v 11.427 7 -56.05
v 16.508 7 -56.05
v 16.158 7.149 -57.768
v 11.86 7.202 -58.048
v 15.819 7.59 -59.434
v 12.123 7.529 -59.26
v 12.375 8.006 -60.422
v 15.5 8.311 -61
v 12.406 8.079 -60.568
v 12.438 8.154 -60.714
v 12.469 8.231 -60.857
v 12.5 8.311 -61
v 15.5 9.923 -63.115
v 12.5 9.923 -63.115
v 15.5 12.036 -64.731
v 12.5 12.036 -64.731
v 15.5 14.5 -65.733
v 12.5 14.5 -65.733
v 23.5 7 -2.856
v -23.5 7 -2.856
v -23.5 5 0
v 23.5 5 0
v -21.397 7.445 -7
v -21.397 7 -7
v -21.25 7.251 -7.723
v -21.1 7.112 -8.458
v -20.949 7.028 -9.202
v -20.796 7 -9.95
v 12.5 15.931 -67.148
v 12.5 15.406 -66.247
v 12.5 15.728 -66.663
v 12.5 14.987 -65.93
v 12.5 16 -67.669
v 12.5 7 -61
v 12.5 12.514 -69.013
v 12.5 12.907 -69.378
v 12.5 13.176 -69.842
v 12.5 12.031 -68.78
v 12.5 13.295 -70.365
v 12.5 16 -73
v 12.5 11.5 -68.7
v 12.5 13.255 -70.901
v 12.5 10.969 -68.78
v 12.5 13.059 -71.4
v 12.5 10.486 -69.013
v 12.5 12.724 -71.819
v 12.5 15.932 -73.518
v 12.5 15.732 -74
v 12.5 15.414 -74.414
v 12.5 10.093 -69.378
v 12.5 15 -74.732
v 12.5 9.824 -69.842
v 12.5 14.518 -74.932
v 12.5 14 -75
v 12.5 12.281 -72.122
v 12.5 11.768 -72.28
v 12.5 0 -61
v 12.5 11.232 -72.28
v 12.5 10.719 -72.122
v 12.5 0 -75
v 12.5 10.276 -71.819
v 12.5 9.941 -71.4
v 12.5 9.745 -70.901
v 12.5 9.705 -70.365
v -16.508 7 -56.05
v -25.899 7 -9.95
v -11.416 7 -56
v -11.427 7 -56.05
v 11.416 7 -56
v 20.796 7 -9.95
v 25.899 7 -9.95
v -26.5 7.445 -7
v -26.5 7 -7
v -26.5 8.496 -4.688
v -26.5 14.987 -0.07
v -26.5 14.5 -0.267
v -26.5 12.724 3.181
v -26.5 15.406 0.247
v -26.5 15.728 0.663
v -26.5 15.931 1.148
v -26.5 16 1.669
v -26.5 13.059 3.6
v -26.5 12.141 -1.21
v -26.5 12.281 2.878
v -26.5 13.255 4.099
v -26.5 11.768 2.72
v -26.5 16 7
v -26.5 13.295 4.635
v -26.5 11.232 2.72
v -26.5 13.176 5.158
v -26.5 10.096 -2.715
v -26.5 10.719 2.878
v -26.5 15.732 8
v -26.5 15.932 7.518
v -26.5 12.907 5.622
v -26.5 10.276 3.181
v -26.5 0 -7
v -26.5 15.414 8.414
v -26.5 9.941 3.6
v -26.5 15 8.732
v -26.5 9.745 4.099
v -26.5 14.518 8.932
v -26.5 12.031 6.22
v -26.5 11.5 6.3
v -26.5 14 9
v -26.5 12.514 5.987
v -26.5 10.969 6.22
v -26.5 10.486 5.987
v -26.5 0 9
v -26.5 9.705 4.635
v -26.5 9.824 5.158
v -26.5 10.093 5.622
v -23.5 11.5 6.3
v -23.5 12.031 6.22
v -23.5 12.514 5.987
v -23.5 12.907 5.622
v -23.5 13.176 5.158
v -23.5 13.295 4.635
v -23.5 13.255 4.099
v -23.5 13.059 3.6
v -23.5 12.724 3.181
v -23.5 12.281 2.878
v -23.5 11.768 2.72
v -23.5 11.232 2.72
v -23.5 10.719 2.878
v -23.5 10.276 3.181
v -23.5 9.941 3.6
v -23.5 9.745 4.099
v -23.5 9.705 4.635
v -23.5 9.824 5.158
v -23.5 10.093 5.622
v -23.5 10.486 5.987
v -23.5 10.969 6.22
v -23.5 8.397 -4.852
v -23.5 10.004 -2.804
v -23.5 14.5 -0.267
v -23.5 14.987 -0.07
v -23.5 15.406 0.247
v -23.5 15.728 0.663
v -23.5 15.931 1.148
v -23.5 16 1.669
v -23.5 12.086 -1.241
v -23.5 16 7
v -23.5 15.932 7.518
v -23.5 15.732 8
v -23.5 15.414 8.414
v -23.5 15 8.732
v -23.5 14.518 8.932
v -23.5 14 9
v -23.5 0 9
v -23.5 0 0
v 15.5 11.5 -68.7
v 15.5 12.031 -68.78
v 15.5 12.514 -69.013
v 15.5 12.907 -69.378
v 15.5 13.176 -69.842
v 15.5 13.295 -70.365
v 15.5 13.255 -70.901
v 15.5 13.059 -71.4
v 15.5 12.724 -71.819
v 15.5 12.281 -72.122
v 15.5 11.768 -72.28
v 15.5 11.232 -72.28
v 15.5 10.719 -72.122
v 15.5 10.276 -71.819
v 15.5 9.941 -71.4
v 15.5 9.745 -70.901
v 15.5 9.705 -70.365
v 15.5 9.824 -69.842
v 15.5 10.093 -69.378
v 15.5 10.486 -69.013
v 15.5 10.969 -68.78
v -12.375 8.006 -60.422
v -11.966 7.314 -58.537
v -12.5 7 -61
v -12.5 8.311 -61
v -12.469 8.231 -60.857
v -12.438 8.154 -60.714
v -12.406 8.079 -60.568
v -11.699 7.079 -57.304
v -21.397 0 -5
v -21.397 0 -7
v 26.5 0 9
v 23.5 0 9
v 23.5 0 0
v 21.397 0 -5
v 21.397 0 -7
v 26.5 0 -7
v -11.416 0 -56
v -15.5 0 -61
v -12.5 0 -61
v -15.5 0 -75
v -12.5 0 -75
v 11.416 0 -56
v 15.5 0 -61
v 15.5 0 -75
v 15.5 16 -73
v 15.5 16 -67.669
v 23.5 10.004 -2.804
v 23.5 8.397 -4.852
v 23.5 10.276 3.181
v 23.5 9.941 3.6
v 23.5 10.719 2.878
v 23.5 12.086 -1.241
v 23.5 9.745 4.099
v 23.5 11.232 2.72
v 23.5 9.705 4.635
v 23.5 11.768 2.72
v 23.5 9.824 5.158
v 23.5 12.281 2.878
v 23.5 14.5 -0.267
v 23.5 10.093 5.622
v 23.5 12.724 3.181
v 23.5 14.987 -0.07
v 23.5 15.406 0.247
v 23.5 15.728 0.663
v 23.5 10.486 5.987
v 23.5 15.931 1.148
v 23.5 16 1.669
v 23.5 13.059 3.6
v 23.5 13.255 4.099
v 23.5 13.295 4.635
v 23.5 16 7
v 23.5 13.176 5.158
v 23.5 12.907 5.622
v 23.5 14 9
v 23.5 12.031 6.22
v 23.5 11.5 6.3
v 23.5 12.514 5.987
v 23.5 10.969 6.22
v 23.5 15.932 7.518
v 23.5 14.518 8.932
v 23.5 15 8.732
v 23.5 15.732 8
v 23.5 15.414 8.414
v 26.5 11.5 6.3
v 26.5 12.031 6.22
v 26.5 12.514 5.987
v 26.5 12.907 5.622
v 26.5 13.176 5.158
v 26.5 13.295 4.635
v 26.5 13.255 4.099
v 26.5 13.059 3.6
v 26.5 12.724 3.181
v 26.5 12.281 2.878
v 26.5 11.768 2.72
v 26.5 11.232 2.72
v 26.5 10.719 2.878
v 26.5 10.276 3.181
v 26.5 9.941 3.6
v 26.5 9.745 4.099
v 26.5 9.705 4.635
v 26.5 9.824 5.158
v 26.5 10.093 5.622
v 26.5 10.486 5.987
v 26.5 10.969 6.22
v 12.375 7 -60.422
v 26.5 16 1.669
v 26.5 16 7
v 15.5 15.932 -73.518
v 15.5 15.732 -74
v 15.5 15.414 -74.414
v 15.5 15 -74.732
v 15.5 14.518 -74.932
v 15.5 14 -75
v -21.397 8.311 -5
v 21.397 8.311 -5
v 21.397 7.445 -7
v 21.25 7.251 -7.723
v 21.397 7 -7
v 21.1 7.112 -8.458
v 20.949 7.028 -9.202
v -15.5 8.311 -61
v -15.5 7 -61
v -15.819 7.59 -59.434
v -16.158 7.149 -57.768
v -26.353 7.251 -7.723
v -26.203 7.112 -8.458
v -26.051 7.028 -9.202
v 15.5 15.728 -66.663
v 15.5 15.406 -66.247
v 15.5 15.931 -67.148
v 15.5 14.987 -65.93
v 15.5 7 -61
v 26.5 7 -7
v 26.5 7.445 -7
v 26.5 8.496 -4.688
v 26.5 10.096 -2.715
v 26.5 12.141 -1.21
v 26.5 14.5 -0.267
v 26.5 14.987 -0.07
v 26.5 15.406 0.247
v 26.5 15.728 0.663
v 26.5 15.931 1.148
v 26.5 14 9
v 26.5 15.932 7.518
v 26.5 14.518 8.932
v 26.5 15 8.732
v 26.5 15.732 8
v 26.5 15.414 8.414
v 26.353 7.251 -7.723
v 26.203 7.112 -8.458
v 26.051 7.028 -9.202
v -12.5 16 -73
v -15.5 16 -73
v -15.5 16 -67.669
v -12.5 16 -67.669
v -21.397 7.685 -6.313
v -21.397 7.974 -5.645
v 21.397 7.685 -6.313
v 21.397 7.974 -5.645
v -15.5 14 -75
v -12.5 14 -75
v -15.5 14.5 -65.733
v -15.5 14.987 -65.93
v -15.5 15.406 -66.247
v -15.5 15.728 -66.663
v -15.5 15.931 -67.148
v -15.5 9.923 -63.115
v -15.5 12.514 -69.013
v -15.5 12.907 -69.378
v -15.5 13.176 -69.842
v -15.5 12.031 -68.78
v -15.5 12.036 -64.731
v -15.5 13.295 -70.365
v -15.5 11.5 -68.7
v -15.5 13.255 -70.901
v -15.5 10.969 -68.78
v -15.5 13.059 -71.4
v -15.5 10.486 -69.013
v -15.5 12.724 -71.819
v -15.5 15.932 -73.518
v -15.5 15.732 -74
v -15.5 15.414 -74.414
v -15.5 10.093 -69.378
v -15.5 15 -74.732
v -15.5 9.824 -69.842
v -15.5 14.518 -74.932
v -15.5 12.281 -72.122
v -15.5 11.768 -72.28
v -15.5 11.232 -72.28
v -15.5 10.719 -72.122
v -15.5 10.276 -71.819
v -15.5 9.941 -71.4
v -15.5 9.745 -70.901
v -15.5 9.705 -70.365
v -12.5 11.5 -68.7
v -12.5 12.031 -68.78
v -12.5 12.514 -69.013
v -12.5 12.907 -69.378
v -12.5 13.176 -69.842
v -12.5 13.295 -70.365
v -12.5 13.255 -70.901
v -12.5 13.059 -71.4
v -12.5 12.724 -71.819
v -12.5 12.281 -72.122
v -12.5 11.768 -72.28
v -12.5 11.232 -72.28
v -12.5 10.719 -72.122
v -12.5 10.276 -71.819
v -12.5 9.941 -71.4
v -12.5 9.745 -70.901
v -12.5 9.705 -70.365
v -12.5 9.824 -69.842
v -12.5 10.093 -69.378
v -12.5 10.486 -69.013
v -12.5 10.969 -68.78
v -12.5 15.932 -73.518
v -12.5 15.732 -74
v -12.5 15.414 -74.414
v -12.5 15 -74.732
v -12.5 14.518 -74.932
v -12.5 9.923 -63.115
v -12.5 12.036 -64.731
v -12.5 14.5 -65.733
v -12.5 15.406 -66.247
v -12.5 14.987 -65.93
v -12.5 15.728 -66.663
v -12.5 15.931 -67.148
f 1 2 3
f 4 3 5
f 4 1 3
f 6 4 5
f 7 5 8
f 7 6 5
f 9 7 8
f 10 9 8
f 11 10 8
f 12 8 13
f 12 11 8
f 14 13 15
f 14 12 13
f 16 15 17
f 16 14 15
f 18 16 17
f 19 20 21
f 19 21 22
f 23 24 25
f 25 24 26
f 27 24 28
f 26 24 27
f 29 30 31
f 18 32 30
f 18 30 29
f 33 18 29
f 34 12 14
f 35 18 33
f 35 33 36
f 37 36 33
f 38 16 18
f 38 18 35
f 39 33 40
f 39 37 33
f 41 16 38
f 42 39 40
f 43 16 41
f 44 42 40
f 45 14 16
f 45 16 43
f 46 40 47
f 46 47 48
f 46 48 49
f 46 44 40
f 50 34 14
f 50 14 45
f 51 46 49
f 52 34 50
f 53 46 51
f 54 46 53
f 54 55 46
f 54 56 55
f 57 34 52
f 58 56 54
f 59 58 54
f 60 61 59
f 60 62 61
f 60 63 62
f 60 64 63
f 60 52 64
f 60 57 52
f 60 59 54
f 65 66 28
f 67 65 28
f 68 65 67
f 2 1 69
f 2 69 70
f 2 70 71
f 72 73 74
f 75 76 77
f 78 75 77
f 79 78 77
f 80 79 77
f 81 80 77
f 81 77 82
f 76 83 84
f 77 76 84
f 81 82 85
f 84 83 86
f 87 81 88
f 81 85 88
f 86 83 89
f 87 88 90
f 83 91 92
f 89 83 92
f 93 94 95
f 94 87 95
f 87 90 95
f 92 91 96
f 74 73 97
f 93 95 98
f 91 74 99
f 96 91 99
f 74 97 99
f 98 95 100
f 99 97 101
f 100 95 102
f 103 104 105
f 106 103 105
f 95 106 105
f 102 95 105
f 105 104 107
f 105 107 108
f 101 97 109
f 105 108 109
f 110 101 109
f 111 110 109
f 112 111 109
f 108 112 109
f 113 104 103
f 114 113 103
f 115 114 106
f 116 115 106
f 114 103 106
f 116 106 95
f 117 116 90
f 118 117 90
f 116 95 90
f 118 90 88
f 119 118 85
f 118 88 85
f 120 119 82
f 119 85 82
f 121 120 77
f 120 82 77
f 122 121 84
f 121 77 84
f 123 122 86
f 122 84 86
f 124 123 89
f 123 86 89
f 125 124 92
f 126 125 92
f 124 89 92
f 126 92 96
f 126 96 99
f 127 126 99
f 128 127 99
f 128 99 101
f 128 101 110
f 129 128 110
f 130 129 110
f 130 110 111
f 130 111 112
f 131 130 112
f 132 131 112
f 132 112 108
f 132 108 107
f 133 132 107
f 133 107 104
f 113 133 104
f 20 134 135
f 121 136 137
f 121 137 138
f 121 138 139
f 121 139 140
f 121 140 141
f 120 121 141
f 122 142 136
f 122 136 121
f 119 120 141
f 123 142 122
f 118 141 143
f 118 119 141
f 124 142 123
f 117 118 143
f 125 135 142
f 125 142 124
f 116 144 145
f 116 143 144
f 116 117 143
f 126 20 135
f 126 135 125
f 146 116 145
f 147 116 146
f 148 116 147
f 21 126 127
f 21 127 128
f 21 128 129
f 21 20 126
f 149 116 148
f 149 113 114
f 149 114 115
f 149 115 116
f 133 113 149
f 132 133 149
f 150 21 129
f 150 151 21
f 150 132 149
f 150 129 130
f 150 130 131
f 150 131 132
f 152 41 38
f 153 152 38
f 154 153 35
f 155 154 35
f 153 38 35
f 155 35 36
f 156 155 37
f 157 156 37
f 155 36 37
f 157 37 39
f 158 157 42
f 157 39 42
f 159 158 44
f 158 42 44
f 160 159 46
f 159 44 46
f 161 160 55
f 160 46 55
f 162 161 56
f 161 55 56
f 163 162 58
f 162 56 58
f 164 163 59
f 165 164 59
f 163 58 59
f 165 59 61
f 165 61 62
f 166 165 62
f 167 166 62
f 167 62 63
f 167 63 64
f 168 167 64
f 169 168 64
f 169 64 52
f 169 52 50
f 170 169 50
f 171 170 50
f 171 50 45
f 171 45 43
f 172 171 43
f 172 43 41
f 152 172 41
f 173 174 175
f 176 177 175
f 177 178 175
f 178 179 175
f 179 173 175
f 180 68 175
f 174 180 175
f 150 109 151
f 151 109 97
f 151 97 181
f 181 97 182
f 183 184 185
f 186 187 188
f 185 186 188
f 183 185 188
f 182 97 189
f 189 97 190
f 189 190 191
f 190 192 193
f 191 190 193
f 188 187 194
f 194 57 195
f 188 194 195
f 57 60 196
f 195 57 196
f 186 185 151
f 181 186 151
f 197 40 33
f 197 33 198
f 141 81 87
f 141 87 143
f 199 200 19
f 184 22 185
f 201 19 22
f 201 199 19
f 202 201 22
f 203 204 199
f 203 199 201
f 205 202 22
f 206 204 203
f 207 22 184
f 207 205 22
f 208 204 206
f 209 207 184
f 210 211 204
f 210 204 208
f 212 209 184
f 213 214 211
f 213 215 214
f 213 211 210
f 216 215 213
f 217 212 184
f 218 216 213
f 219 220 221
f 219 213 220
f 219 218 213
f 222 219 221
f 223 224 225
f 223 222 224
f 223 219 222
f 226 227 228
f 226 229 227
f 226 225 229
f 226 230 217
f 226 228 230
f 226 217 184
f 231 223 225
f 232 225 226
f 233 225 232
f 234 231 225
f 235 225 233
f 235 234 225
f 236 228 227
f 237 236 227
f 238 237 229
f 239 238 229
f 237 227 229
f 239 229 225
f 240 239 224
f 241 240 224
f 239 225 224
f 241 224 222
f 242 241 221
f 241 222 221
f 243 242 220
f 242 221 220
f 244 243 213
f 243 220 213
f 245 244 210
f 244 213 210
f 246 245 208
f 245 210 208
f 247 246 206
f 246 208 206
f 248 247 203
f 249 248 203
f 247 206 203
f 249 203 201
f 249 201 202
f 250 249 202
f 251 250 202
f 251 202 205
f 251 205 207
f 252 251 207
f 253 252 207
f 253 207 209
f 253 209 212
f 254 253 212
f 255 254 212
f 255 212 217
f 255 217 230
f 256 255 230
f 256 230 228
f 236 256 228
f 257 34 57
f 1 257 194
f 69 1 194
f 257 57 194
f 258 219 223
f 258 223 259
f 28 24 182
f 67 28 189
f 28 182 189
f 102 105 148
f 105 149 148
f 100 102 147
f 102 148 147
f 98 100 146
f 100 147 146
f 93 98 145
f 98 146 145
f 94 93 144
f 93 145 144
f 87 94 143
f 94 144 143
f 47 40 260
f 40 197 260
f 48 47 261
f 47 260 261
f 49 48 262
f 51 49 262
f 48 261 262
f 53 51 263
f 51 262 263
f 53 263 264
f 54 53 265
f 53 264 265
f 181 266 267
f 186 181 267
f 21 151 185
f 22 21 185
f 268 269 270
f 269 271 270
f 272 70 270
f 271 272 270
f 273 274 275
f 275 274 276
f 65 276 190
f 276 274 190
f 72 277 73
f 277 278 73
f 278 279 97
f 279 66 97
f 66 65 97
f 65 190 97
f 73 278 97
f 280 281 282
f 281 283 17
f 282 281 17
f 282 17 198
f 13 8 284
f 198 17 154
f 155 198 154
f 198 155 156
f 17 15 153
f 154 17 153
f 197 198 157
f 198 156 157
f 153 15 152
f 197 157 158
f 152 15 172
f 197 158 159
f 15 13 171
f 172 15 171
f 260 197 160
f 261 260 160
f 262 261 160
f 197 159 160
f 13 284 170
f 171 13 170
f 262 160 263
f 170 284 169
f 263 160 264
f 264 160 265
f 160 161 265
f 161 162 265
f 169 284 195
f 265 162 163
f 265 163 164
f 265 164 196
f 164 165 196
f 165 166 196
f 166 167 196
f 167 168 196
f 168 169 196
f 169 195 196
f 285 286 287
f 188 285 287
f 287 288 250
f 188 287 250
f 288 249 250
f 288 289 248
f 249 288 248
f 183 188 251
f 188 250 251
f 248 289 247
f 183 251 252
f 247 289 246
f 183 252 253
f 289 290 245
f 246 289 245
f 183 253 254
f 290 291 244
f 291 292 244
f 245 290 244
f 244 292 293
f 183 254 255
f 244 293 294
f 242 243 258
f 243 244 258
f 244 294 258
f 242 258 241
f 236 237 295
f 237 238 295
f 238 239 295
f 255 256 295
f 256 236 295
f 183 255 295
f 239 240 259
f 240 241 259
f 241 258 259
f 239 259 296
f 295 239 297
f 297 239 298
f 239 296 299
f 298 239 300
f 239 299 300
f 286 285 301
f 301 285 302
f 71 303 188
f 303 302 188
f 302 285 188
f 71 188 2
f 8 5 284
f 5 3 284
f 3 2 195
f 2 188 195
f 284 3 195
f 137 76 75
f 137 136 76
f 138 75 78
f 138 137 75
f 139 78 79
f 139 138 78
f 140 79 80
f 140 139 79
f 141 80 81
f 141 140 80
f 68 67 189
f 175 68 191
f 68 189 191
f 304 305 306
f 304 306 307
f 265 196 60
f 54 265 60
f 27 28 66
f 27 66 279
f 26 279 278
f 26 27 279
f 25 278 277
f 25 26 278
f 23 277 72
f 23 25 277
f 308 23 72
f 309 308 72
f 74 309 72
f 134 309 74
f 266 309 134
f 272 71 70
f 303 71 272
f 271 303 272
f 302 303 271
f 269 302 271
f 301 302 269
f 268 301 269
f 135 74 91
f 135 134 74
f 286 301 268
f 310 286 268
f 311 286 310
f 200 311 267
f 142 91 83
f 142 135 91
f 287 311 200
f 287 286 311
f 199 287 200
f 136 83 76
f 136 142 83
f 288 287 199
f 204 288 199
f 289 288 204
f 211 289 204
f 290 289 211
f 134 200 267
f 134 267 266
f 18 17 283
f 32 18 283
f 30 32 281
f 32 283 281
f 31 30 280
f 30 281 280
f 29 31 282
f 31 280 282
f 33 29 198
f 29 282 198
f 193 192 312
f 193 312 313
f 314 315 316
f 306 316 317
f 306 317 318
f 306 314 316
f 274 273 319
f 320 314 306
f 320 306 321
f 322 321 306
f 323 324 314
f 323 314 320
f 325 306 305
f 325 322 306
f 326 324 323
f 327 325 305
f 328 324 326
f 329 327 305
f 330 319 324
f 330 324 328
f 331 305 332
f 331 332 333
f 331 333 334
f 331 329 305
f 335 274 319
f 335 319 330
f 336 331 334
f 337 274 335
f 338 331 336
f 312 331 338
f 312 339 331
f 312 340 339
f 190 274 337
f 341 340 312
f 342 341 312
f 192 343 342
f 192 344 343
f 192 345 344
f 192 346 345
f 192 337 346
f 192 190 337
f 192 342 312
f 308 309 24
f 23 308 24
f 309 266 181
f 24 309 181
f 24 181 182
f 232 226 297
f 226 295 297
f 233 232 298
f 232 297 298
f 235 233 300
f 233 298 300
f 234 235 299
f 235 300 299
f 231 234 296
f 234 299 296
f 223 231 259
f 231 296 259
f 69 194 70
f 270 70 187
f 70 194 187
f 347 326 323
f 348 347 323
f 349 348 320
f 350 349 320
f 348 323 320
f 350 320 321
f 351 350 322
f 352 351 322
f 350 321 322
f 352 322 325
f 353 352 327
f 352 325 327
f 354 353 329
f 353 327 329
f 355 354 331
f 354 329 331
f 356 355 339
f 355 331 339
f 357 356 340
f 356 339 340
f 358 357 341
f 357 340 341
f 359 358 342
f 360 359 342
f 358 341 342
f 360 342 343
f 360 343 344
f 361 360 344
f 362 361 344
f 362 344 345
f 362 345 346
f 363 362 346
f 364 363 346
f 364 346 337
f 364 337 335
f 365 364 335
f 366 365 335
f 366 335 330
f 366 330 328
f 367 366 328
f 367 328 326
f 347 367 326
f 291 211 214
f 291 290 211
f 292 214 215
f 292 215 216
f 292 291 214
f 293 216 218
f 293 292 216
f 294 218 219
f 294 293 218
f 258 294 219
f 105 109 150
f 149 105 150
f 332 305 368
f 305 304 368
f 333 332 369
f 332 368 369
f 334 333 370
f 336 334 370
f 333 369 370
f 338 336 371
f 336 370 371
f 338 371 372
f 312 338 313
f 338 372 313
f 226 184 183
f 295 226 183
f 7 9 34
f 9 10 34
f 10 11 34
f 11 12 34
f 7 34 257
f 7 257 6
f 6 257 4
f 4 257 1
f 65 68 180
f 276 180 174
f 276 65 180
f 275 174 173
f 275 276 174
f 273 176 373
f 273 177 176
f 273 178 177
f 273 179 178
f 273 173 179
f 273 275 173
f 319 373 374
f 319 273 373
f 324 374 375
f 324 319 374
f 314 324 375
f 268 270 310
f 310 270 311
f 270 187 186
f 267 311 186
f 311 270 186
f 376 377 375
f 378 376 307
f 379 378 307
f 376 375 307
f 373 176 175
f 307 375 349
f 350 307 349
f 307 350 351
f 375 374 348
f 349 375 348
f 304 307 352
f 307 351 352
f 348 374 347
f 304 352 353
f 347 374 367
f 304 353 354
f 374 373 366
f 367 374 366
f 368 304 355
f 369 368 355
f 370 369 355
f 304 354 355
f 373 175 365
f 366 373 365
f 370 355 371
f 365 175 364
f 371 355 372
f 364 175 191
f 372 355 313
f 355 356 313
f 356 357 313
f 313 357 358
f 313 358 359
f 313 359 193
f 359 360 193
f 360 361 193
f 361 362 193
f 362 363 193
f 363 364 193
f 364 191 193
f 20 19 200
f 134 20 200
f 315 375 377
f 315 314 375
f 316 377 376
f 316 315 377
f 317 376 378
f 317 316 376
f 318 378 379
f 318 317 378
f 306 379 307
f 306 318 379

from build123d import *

# Parameters (mm, degrees)
BOSS_EXTRUDE1_DEPTH  = 7
BOSS_EXTRUDE2_START  = 7
SKETCH1_3_W          = 3
SKETCH1_3_H          = 9
BOSS_EXTRUDE2_DEPTH  = 9
M3_CLEARANCE_HOLE1_D = 3.6
CHAMFER1_SIZE        = 2
CHAMFER1_SIZE2       = 2.856296013
FILLET1_R            = 10
FILLET2_R            = 2


with BuildPart() as part:
    # Sketch1 → Boss-Extrude1 (new body)
    with BuildSketch(Plane(origin=(0, 0, 0), x_dir=(1, 0, 0), z_dir=(0, 1, 0))):
        Polygon((-23.5, -9), (-23.5, 0), (23.5, 0), (23.5, -9), (26.5, -9), (26.5, 7), (15.5, 61), (15.5, 75), (12.5, 75), (12.5, 61), (11.415834914, 56), (21.397316395, 7), (21.397316395, 5), (-21.397316395, 5), (-21.397316395, 7), (-11.415834914, 56), (-12.5, 61), (-12.5, 75), (-15.5, 75), (-15.5, 61), (-26.5, 7), (-26.5, -9), align=None)
    extrude(amount=BOSS_EXTRUDE1_DEPTH)

    # Sketch1<3> → Boss-Extrude2 (add)
    with BuildSketch(Plane(origin=(0, 0, 0), x_dir=(1, 0, 0), z_dir=(0, 1, 0)).offset(BOSS_EXTRUDE2_START)):
        with Locations((-14, 70.5)):
            Rectangle(SKETCH1_3_W, SKETCH1_3_H)
        with Locations((14, 70.5)):
            Rectangle(SKETCH1_3_W, SKETCH1_3_H)
        with Locations((-25, -4.5)):
            Rectangle(SKETCH1_3_W, SKETCH1_3_H)
        with Locations((25, -4.5)):
            Rectangle(SKETCH1_3_W, SKETCH1_3_H)
    extrude(amount=BOSS_EXTRUDE2_DEPTH)

    # M3 Clearance Hole1 (through all)
    with Locations(Plane(origin=(26.5, 0, 0), x_dir=(0, 0, -1), z_dir=(1, 0, 0))):
        with Locations((-4.5, 11.5), (70.5, 11.5)):
            Hole(M3_CLEARANCE_HOLE1_D / 2)

    # Chamfer1
    chamfer1_edges = [part.edges().sort_by_distance(p)[0] for p in [
        (0, 7, 0),
    ]]
    chamfer1_side = [part.faces().sort_by_distance(p)[0] for p in [
        (0, 3.5, 0),
    ]]
    chamfer(chamfer1_edges, length=CHAMFER1_SIZE, length2=CHAMFER1_SIZE2, reference=chamfer1_side[0])

    # Fillet1
    # the kernel refuses this fillet: 10 mm, written as the material it adds along each edge
    with BuildSketch(Plane(origin=(-1.374685928, 7, 0), x_dir=(0, 0, -1), z_dir=(1, 0, 0))) as fillet1_piece_1_section:
        with BuildLine():
            CenterArc((9.949874371, 10), FILLET1_R, 185.739170477, 84.260829523)
            Line((0, 9), (0, 0))
            Line((0, 0), (9.949874371, 0))
        make_face()
    fillet1_piece_1 = extrude(amount=27.874685928, mode=Mode.PRIVATE)
    fillet1_piece_1 = split(fillet1_piece_1, bisect_by=Plane(origin=(10.011315234, 8.407248867, -4.866055679), z_dir=(0, -0.819152044288993, -0.5735764363510445)), keep=Keep.TOP, mode=Mode.PRIVATE)
    fillet1_piece_1 = split(fillet1_piece_1, bisect_by=Plane(origin=(10.011315234, 8.336481062, -5), z_dir=(0, 0, 1)), keep=Keep.TOP, mode=Mode.PRIVATE)
    add(fillet1_piece_1)
    with BuildSketch(Plane(origin=(-1.374685928, 7, 0), x_dir=(0, 0, -1), z_dir=(1, 0, 0))) as fillet1_piece_2_section:
        with BuildLine():
            CenterArc((9.949874371, 10), FILLET1_R, 185.739170477, 84.260829523)
            Line((0, 9), (0, 0))
            Line((0, 0), (9.949874371, 0))
        make_face()
    fillet1_piece_2 = extrude(amount=27.874685928, mode=Mode.PRIVATE)
    fillet1_piece_2 = split(fillet1_piece_2, bisect_by=Plane(origin=(26.506585427, 7.804991574, -6.967671542), z_dir=(-0.9798765487080173, 0, 0.19960448214422577)), keep=Keep.TOP, mode=Mode.PRIVATE)
    fillet1_piece_2 = split(fillet1_piece_2, bisect_by=Plane(origin=(21.601020113, 7.804991574, -5), z_dir=(0, 0, -1)), keep=Keep.TOP, mode=Mode.PRIVATE)
    fillet1_piece_2 = split(fillet1_piece_2, bisect_by=Plane(origin=(21.397316395, 7.804991574, -5.968389718), z_dir=(1, 0, 0)), keep=Keep.TOP, mode=Mode.PRIVATE)
    add(fillet1_piece_2)
    with BuildSketch(Plane(origin=(-1.374685928, 7, 0), x_dir=(0, 0, -1), z_dir=(1, 0, 0))) as fillet1_piece_3_section:
        with BuildLine():
            CenterArc((9.949874371, 10), FILLET1_R, 185.739170477, 84.260829523)
            Line((0, 9), (0, 0))
            Line((0, 0), (9.949874371, 0))
        make_face()
    fillet1_piece_3 = extrude(amount=52.749371855, mode=Mode.PRIVATE)
    fillet1_piece_3 = split(fillet1_piece_3, bisect_by=Plane(origin=(20.913958027, 7.01045348, -9.37285017), z_dir=(0.9798765487080173, 0, -0.1996044821442258)), keep=Keep.TOP, mode=Mode.PRIVATE)
    fillet1_piece_3 = split(fillet1_piece_3, bisect_by=Plane(origin=(21.397316395, 7.01045348, -9.450911129), z_dir=(-1, 0, 0)), keep=Keep.TOP, mode=Mode.PRIVATE)
    add(fillet1_piece_3)
    with BuildSketch(Plane(origin=(23.5, 7, 0), x_dir=(0, 0, -1), z_dir=(1, 0, 0))) as fillet1_piece_4_section:
        with BuildLine():
            CenterArc((9.949874371, 10), FILLET1_R, 185.739170477, 84.260829523)
            Line((0, 9), (0, 0))
            Line((0, 0), (9.949874371, 0))
        make_face()
    fillet1_piece_4 = extrude(amount=3, mode=Mode.PRIVATE)
    fillet1_piece_4 = split(fillet1_piece_4, bisect_by=Plane(origin=(25, 11.609815369, -5), z_dir=(0, 0, 1)), keep=Keep.TOP, mode=Mode.PRIVATE)
    add(fillet1_piece_4)
    with BuildSketch(Plane(origin=(-15.5, 7, -66), x_dir=(0, 0, 1), z_dir=(1, 0, 0))) as fillet1_piece_5_section:
        with BuildLine():
            CenterArc((9.949874371, -10), FILLET1_R, 90, 84.260829523)
            Line((0, -9), (0, 0))
            Line((0, 0), (9.949874371, 0))
        make_face()
    fillet1_piece_5 = extrude(amount=27.874685928, mode=Mode.PRIVATE)
    fillet1_piece_5 = split(fillet1_piece_5, bisect_by=Plane(origin=(-13.326382184, 11.537566275, -64.811145527), z_dir=(-0.9772894830316591, 0, 0.21190862737442448)), keep=Keep.TOP, mode=Mode.PRIVATE)
    add(fillet1_piece_5)
    with BuildSketch(Plane(origin=(-40.374685928, 7, -66), x_dir=(0, 0, 1), z_dir=(1, 0, 0))) as fillet1_piece_6_section:
        with BuildLine():
            CenterArc((9.949874371, -10), FILLET1_R, 90, 84.260829523)
            Line((0, -9), (0, 0))
            Line((0, 0), (9.949874371, 0))
        make_face()
    fillet1_piece_6 = extrude(amount=27.874685928, mode=Mode.PRIVATE)
    fillet1_piece_6 = split(fillet1_piece_6, bisect_by=Plane(origin=(-16.305903703, 7.017292707, -57.04374546), z_dir=(0.9798765487080173, 0, 0.19960448214422577)), keep=Keep.TOP, mode=Mode.PRIVATE)
    add(fillet1_piece_6)
    with BuildSketch(Plane(origin=(-40.374685928, 7, -66), x_dir=(0, 0, 1), z_dir=(1, 0, 0))) as fillet1_piece_7_section:
        with BuildLine():
            CenterArc((9.949874371, -10), FILLET1_R, 90, 84.260829523)
            Line((0, -9), (0, 0))
            Line((0, 0), (9.949874371, 0))
        make_face()
    fillet1_piece_7 = extrude(amount=52.749371855, mode=Mode.PRIVATE)
    fillet1_piece_7 = split(fillet1_piece_7, bisect_by=Plane(origin=(11.618519357, 7.008478839, -56.93474899), z_dir=(0.977289483031659, 0, 0.2119086273744248)), keep=Keep.TOP, mode=Mode.PRIVATE)
    add(fillet1_piece_7)
    with BuildSketch(Plane(origin=(-12.374685928, 7, -66), x_dir=(0, 0, 1), z_dir=(1, 0, 0))) as fillet1_piece_8_section:
        with BuildLine():
            CenterArc((9.949874371, -10), FILLET1_R, 90, 84.260829523)
            Line((0, -9), (0, 0))
            Line((0, 0), (9.949874371, 0))
        make_face()
    fillet1_piece_8 = extrude(amount=52.749371855, mode=Mode.PRIVATE)
    fillet1_piece_8 = split(fillet1_piece_8, bisect_by=Plane(origin=(-11.604329561, 7.008478839, -56.869307865), z_dir=(-0.9772894830316591, 0, 0.21190862737442448)), keep=Keep.TOP, mode=Mode.PRIVATE)
    add(fillet1_piece_8)
    with BuildSketch(Plane(origin=(12.5, 7, -66), x_dir=(0, 0, 1), z_dir=(1, 0, 0))) as fillet1_piece_9:
        with BuildLine():
            CenterArc((9.949874371, -10), FILLET1_R, 90, 84.260829523)
            Line((0, -9), (0, 0))
            Line((0, 0), (9.949874371, 0))
        make_face()
    extrude(amount=3)
    with BuildSketch(Plane(origin=(-12.374685928, 7, -66), x_dir=(0, 0, 1), z_dir=(1, 0, 0))) as fillet1_piece_10_section:
        with BuildLine():
            CenterArc((9.949874371, -10), FILLET1_R, 90, 84.260829523)
            Line((0, -9), (0, 0))
            Line((0, 0), (9.949874371, 0))
        make_face()
    fillet1_piece_10 = extrude(amount=52.749371855, mode=Mode.PRIVATE)
    fillet1_piece_10 = split(fillet1_piece_10, bisect_by=Plane(origin=(16.17255533, 7.017292707, -57.698364743), z_dir=(-0.9798765487080173, 0, 0.19960448214422577)), keep=Keep.TOP, mode=Mode.PRIVATE)
    fillet1_piece_10 = split(fillet1_piece_10, bisect_by=Plane(origin=(11.645733853, 7.017292707, -57.060257993), z_dir=(0.977289483031659, 0, 0.2119086273744248)), keep=Keep.TOP, mode=Mode.PRIVATE)
    add(fillet1_piece_10)
    with BuildSketch(Plane(origin=(1.374685928, 7, 0), x_dir=(0, 0, -1), z_dir=(-1, 0, 0))) as fillet1_piece_11_section:
        with BuildLine():
            CenterArc((9.949874371, -10), FILLET1_R, 90, 84.260829523)
            Line((0, -9), (0, 0))
            Line((0, 0), (9.949874371, 0))
        make_face()
    fillet1_piece_11 = extrude(amount=27.874685928, mode=Mode.PRIVATE)
    fillet1_piece_11 = split(fillet1_piece_11, bisect_by=Plane(origin=(-10.011315234, 8.407248867, -4.866055679), z_dir=(0, -0.819152044288993, -0.5735764363510445)), keep=Keep.TOP, mode=Mode.PRIVATE)
    fillet1_piece_11 = split(fillet1_piece_11, bisect_by=Plane(origin=(-10.011315234, 8.336481062, -5), z_dir=(0, 0, 1)), keep=Keep.TOP, mode=Mode.PRIVATE)
    add(fillet1_piece_11)
    with BuildSketch(Plane(origin=(1.374685928, 7, 0), x_dir=(0, 0, -1), z_dir=(-1, 0, 0))) as fillet1_piece_12_section:
        with BuildLine():
            CenterArc((9.949874371, -10), FILLET1_R, 90, 84.260829523)
            Line((0, -9), (0, 0))
            Line((0, 0), (9.949874371, 0))
        make_face()
    fillet1_piece_12 = extrude(amount=27.874685928, mode=Mode.PRIVATE)
    fillet1_piece_12 = split(fillet1_piece_12, bisect_by=Plane(origin=(-26.506585427, 7.804991574, -6.967671542), z_dir=(0.9798765487080173, 0, 0.19960448214422577)), keep=Keep.TOP, mode=Mode.PRIVATE)
    fillet1_piece_12 = split(fillet1_piece_12, bisect_by=Plane(origin=(-21.397316395, 7.804991574, -5.968389718), z_dir=(-1, 0, 0)), keep=Keep.TOP, mode=Mode.PRIVATE)
    fillet1_piece_12 = split(fillet1_piece_12, bisect_by=Plane(origin=(-21.601020113, 7.804991574, -5), z_dir=(0, 0, -1)), keep=Keep.TOP, mode=Mode.PRIVATE)
    add(fillet1_piece_12)
    with BuildSketch(Plane(origin=(1.374685928, 7, 0), x_dir=(0, 0, -1), z_dir=(-1, 0, 0))) as fillet1_piece_13_section:
        with BuildLine():
            CenterArc((9.949874371, -10), FILLET1_R, 90, 84.260829523)
            Line((0, -9), (0, 0))
            Line((0, 0), (9.949874371, 0))
        make_face()
    fillet1_piece_13 = extrude(amount=27.874685928, mode=Mode.PRIVATE)
    fillet1_piece_13 = split(fillet1_piece_13, bisect_by=Plane(origin=(-25.813340771, 7.01045348, -10.370872581), z_dir=(0.9798765487080173, 0, 0.19960448214422577)), keep=Keep.TOP, mode=Mode.PRIVATE)
    fillet1_piece_13 = split(fillet1_piece_13, bisect_by=Plane(origin=(-20.913958027, 7.01045348, -9.37285017), z_dir=(-0.9798765487080173, 0, -0.19960448214422577)), keep=Keep.TOP, mode=Mode.PRIVATE)
    fillet1_piece_13 = split(fillet1_piece_13, bisect_by=Plane(origin=(-21.297166367, 7.01045348, -5), z_dir=(0, 0, -1)), keep=Keep.TOP, mode=Mode.PRIVATE)
    add(fillet1_piece_13)
    with BuildSketch(Plane(origin=(-23.5, 7, 0), x_dir=(0, 0, -1), z_dir=(-1, 0, 0))) as fillet1_piece_14_section:
        with BuildLine():
            CenterArc((9.949874371, -10), FILLET1_R, 90, 84.260829523)
            Line((0, -9), (0, 0))
            Line((0, 0), (9.949874371, 0))
        make_face()
    fillet1_piece_14 = extrude(amount=3, mode=Mode.PRIVATE)
    fillet1_piece_14 = split(fillet1_piece_14, bisect_by=Plane(origin=(-25, 11.609815369, -5), z_dir=(0, 0, 1)), keep=Keep.TOP, mode=Mode.PRIVATE)
    add(fillet1_piece_14)

    # Fillet2
    fillet2_edges = [part.edges().sort_by_distance(p)[0] for p in [
        (25, 16, 9),
        (25, 16, 0),
        (-14, 16, -75),
        (-14, 16, -66),
        (14, 16, -75),
        (14, 16, -66),
        (-25, 16, 9),
        (-25, 16, 0),
    ]]
    fillet(fillet2_edges, radius=FILLET2_R)


solid = part.part
